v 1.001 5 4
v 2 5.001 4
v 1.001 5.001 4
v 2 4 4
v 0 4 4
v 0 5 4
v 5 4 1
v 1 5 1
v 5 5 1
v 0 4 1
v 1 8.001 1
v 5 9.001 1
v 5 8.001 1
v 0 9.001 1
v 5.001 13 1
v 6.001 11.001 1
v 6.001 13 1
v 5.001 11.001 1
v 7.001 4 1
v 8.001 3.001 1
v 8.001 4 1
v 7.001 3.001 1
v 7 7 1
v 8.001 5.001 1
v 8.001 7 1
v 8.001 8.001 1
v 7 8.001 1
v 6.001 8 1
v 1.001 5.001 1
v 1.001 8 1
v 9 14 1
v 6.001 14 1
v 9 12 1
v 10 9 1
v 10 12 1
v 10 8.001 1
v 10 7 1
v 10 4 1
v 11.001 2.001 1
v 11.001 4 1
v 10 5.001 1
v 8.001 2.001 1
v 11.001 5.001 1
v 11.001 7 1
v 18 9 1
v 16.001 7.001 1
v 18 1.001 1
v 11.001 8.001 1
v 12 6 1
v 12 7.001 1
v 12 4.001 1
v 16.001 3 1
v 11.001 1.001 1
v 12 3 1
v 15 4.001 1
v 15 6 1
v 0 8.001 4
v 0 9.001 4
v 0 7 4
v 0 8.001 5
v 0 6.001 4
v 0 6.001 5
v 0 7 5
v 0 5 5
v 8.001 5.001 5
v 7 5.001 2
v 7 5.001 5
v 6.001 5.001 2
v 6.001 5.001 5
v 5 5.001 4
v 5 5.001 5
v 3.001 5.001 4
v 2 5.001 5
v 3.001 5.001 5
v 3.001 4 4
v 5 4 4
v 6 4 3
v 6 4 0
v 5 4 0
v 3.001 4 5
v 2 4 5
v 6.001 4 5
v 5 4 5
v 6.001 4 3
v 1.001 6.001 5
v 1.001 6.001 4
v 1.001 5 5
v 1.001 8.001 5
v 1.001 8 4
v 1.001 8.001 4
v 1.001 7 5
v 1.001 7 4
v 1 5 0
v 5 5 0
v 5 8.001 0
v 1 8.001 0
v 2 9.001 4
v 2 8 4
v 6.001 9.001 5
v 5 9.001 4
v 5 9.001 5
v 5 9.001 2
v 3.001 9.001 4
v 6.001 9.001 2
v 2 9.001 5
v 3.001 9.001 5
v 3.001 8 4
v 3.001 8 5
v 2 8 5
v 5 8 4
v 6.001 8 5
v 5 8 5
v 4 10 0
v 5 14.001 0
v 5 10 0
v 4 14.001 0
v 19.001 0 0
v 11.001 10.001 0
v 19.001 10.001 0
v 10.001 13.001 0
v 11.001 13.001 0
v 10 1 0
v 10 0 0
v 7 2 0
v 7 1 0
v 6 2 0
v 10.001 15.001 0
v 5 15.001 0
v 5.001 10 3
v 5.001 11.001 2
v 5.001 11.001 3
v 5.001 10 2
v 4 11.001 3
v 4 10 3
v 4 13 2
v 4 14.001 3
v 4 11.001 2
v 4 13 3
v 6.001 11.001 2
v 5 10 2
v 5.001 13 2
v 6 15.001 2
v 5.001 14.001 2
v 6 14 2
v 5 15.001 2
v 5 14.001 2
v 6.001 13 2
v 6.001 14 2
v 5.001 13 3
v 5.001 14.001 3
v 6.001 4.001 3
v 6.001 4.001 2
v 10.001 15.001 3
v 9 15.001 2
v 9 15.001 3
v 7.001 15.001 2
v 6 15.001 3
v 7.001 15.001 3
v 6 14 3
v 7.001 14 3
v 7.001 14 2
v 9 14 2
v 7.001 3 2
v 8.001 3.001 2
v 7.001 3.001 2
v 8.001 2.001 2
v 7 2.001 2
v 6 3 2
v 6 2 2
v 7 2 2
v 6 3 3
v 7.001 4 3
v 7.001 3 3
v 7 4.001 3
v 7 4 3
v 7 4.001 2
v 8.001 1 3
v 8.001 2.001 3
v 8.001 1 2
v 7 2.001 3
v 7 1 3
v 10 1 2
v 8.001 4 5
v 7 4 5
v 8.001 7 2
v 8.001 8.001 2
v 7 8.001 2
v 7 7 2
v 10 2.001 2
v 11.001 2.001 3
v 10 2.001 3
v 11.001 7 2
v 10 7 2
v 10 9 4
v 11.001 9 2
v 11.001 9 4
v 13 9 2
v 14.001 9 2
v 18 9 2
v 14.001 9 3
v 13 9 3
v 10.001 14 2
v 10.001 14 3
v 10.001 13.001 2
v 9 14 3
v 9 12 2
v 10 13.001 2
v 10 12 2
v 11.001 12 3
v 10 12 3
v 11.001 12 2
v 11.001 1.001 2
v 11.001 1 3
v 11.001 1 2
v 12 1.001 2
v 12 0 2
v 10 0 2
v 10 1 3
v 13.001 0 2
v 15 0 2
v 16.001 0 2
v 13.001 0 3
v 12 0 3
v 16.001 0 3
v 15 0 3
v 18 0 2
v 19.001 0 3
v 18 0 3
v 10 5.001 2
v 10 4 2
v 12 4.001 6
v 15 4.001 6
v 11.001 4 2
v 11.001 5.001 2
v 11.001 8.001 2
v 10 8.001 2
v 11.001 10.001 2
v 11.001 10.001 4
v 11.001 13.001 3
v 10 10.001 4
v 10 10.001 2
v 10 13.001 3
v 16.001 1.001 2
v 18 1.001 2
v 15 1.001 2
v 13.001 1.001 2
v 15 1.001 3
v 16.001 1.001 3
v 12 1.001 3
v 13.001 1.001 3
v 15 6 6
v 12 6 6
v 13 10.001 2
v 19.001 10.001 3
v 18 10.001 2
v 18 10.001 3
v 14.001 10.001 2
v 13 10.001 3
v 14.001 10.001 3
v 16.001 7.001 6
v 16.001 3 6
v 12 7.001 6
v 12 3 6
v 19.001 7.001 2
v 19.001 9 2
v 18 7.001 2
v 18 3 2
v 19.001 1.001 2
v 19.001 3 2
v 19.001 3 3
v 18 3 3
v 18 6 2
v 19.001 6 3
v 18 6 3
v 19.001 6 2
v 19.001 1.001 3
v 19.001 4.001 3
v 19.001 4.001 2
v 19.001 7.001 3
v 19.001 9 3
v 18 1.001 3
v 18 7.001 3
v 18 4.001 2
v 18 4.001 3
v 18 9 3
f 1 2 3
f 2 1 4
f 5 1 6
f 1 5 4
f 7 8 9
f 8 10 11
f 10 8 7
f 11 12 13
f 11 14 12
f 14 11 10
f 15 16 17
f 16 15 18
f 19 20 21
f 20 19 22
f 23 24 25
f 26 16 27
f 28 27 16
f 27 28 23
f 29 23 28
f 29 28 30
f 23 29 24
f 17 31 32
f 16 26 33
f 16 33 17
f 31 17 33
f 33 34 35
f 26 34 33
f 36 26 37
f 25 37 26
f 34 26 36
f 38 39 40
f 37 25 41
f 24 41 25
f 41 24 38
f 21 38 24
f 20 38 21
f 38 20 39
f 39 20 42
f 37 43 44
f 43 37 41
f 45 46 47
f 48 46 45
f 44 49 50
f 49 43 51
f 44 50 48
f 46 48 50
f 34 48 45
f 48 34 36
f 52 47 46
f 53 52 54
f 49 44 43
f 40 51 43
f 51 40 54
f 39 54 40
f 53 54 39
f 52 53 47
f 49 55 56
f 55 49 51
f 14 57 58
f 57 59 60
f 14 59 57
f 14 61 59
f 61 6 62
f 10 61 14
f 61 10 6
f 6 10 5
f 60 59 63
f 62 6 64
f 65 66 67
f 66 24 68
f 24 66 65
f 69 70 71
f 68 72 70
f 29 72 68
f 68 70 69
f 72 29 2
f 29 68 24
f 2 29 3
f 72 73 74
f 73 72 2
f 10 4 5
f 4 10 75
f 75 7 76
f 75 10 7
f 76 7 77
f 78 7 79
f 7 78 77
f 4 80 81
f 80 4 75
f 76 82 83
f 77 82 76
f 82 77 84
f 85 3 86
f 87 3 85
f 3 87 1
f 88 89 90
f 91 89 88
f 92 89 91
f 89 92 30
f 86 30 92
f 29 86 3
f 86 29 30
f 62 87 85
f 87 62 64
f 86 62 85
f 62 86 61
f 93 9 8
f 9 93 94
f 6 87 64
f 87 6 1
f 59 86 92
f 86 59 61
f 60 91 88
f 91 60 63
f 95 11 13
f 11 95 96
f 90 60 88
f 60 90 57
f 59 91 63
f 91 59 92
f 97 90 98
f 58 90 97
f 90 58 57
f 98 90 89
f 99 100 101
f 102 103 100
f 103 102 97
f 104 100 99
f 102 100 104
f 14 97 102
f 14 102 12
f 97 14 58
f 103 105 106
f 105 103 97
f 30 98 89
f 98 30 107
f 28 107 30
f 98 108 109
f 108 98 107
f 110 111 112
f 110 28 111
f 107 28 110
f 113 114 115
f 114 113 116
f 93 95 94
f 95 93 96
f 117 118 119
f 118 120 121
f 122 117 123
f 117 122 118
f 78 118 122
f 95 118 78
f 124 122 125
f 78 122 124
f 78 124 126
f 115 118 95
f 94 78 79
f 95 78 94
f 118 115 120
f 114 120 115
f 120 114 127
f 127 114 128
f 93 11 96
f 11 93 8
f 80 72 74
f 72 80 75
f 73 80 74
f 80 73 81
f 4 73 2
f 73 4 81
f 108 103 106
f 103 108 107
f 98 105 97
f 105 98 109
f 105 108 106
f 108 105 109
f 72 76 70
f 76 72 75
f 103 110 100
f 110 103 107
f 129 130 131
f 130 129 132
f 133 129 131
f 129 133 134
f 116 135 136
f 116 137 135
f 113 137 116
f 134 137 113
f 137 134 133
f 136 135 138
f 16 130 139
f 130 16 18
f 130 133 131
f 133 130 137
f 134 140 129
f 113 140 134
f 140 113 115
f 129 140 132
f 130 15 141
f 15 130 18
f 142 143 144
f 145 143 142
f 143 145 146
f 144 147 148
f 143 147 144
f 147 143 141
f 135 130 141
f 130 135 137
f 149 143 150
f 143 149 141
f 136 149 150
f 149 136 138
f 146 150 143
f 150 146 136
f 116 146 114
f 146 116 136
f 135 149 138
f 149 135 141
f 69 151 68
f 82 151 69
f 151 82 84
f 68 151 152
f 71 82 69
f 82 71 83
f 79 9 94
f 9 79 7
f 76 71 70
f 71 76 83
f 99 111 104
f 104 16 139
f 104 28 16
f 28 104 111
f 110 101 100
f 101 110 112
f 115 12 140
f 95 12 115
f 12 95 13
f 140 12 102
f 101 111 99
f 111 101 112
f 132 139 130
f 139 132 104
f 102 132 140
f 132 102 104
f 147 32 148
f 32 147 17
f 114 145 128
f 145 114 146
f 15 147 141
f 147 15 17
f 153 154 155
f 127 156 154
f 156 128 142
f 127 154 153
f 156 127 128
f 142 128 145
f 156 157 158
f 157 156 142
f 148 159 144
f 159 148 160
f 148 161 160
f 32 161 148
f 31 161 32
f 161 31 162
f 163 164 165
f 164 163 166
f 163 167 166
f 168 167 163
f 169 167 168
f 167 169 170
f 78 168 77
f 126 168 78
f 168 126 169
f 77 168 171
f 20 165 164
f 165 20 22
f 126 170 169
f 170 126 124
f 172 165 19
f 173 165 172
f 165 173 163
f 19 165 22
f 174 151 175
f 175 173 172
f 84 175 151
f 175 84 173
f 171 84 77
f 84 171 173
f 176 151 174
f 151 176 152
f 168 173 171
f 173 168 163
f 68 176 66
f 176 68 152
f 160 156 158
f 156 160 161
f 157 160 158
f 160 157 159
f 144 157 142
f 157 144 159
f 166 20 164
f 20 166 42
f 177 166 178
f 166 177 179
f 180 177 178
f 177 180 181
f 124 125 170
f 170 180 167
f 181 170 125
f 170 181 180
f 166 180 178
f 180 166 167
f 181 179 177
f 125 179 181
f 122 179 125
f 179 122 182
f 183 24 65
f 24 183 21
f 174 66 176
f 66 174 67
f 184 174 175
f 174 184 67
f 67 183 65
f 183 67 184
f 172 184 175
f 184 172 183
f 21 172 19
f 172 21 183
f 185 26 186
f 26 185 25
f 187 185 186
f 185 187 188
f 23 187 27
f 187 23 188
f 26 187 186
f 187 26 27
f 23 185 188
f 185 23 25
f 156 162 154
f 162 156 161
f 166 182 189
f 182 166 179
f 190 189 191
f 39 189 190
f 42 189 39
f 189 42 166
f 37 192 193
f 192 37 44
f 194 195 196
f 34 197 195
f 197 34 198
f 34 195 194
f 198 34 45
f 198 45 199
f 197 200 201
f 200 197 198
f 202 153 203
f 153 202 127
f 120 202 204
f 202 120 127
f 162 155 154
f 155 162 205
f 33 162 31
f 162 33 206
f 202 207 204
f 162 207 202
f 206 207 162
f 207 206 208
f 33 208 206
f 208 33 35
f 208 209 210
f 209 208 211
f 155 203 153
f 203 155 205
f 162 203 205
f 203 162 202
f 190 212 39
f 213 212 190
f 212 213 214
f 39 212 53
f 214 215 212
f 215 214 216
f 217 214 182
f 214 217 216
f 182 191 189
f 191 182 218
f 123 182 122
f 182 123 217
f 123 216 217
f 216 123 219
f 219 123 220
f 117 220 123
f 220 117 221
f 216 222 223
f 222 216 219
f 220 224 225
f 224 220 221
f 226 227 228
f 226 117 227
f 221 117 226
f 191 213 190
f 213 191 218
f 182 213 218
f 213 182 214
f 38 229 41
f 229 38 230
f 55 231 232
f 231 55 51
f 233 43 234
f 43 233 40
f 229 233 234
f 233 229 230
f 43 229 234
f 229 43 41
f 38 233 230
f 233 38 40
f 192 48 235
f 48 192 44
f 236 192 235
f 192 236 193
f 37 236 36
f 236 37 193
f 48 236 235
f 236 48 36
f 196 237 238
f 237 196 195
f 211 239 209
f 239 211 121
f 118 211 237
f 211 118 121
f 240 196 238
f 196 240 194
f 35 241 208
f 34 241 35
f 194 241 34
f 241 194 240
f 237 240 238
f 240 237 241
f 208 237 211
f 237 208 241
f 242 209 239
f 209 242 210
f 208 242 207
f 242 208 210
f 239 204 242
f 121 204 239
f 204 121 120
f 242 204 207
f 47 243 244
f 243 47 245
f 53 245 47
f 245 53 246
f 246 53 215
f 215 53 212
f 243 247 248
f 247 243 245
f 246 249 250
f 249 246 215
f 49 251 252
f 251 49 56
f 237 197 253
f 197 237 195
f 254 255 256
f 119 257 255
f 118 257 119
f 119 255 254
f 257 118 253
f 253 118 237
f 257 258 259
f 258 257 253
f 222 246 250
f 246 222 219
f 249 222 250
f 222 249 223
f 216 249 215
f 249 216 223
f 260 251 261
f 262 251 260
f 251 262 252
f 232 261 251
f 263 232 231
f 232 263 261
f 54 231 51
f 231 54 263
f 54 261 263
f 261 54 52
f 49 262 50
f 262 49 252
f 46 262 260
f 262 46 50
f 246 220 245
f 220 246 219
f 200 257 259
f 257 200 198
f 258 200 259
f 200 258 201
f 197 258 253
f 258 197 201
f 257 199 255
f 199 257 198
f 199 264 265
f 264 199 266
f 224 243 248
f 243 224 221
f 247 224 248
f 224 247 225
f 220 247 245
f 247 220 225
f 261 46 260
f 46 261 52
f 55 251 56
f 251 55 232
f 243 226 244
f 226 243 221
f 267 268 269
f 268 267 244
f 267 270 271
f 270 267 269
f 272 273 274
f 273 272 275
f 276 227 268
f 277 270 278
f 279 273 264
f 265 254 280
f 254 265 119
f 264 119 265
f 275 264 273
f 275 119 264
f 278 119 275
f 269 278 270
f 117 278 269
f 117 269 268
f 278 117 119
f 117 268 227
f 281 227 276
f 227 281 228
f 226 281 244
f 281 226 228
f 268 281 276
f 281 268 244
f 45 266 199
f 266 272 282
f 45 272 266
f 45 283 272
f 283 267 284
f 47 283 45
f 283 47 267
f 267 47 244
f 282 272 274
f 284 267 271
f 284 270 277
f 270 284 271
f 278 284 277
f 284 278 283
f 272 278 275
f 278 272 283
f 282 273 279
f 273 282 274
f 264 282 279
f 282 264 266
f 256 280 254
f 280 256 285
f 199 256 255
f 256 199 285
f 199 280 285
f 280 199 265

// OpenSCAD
union () { 
translate([0,4,1]) cube([1.001,1.001,3]);
translate([0,5,1]) cube([1.001,1.001,4]);
translate([0,6,1]) cube([1.001,1.001,3]);
translate([0,7,1]) cube([1.001,1.001,4]);
translate([0,8,1]) cube([1.001,1.001,3]);
translate([1,4,1]) cube([1.001,1.001,3]);
translate([1,5,0]) cube([1.001,1.001,1]);
translate([1,6,0]) cube([1.001,1.001,1]);
translate([1,7,0]) cube([1.001,1.001,1]);
translate([1,8,1]) cube([1.001,1.001,3]);
translate([2,4,1]) cube([1.001,1.001,4]);
translate([2,5,0]) cube([1.001,1.001,1]);
translate([2,6,0]) cube([1.001,1.001,1]);
translate([2,7,0]) cube([1.001,1.001,1]);
translate([2,8,1]) cube([1.001,1.001,4]);
translate([3,4,1]) cube([1.001,1.001,3]);
translate([3,5,0]) cube([1.001,1.001,1]);
translate([3,6,0]) cube([1.001,1.001,1]);
translate([3,7,0]) cube([1.001,1.001,1]);
translate([3,8,1]) cube([1.001,1.001,3]);
translate([4,4,1]) cube([1.001,1.001,3]);
translate([4,5,0]) cube([1.001,1.001,1]);
translate([4,6,0]) cube([1.001,1.001,1]);
translate([4,7,0]) cube([1.001,1.001,1]);
translate([4,8,1]) cube([1.001,1.001,3]);
translate([4,10,0]) cube([1.001,1.001,3]);
translate([4,11,0]) cube([1.001,1.001,2]);
translate([4,12,0]) cube([1.001,1.001,2]);
translate([4,13,0]) cube([1.001,1.001,3]);
translate([5,4,0]) cube([1.001,1.001,5]);
translate([5,5,0]) cube([1.001,1.001,1]);
translate([5,6,0]) cube([1.001,1.001,1]);
translate([5,7,0]) cube([1.001,1.001,1]);
translate([5,8,0]) cube([1.001,1.001,5]);
translate([5,9,0]) cube([1.001,1.001,2]);
translate([5,10,0]) cube([1.001,1.001,2]);
translate([5,11,0]) cube([1.001,1.001,1]);
translate([5,12,0]) cube([1.001,1.001,1]);
translate([5,13,0]) cube([1.001,1.001,2]);
translate([5,14,0]) cube([1.001,1.001,2]);
translate([6,2,0]) cube([1.001,1.001,2]);
translate([6,3,0]) cube([1.001,1.001,3]);
translate([6,4,0]) cube([1.001,1.001,2]);
translate([6,5,0]) cube([1.001,1.001,1]);
translate([6,6,0]) cube([1.001,1.001,1]);
translate([6,7,0]) cube([1.001,1.001,1]);
translate([6,8,0]) cube([1.001,1.001,1]);
translate([6,9,0]) cube([1.001,1.001,1]);
translate([6,10,0]) cube([1.001,1.001,1]);
translate([6,11,0]) cube([1.001,1.001,1]);
translate([6,12,0]) cube([1.001,1.001,1]);
translate([6,13,0]) cube([1.001,1.001,1]);
translate([6,14,0]) cube([1.001,1.001,3]);
translate([7,1,0]) cube([1.001,1.001,3]);
translate([7,2,0]) cube([1.001,1.001,2]);
translate([7,3,0]) cube([1.001,1.001,1]);
translate([7,4,0]) cube([1.001,1.001,5]);
translate([7,5,0]) cube([1.001,1.001,1]);
translate([7,6,0]) cube([1.001,1.001,1]);
translate([7,7,0]) cube([1.001,1.001,2]);
translate([7,8,0]) cube([1.001,1.001,1]);
translate([7,9,0]) cube([1.001,1.001,1]);
translate([7,10,0]) cube([1.001,1.001,1]);
translate([7,11,0]) cube([1.001,1.001,1]);
translate([7,12,0]) cube([1.001,1.001,1]);
translate([7,13,0]) cube([1.001,1.001,1]);
translate([7,14,0]) cube([1.001,1.001,2]);
translate([8,1,0]) cube([1.001,1.001,2]);
translate([8,2,0]) cube([1.001,1.001,1]);
translate([8,3,0]) cube([1.001,1.001,1]);
translate([8,4,0]) cube([1.001,1.001,1]);
translate([8,5,0]) cube([1.001,1.001,1]);
translate([8,6,0]) cube([1.001,1.001,1]);
translate([8,7,0]) cube([1.001,1.001,1]);
translate([8,8,0]) cube([1.001,1.001,1]);
translate([8,9,0]) cube([1.001,1.001,1]);
translate([8,10,0]) cube([1.001,1.001,1]);
translate([8,11,0]) cube([1.001,1.001,1]);
translate([8,12,0]) cube([1.001,1.001,1]);
translate([8,13,0]) cube([1.001,1.001,1]);
translate([8,14,0]) cube([1.001,1.001,2]);
translate([9,1,0]) cube([1.001,1.001,2]);
translate([9,2,0]) cube([1.001,1.001,1]);
translate([9,3,0]) cube([1.001,1.001,1]);
translate([9,4,0]) cube([1.001,1.001,1]);
translate([9,5,0]) cube([1.001,1.001,1]);
translate([9,6,0]) cube([1.001,1.001,1]);
translate([9,7,0]) cube([1.001,1.001,1]);
translate([9,8,0]) cube([1.001,1.001,1]);
translate([9,9,0]) cube([1.001,1.001,1]);
translate([9,10,0]) cube([1.001,1.001,1]);
translate([9,11,0]) cube([1.001,1.001,1]);
translate([9,12,0]) cube([1.001,1.001,2]);
translate([9,13,0]) cube([1.001,1.001,2]);
translate([9,14,0]) cube([1.001,1.001,3]);
translate([10,0,0]) cube([1.001,1.001,2]);
translate([10,1,0]) cube([1.001,1.001,3]);
translate([10,2,0]) cube([1.001,1.001,1]);
translate([10,3,0]) cube([1.001,1.001,1]);
translate([10,4,0]) cube([1.001,1.001,2]);
translate([10,5,0]) cube([1.001,1.001,1]);
translate([10,6,0]) cube([1.001,1.001,1]);
translate([10,7,0]) cube([1.001,1.001,2]);
translate([10,8,0]) cube([1.001,1.001,1]);
translate([10,9,0]) cube([1.001,1.001,4]);
translate([10,10,0]) cube([1.001,1.001,2]);
translate([10,11,0]) cube([1.001,1.001,2]);
translate([10,12,0]) cube([1.001,1.001,3]);
translate([11,0,0]) cube([1.001,1.001,2]);
translate([11,1,0]) cube([1.001,1.001,1]);
translate([11,2,0]) cube([1.001,1.001,1]);
translate([11,3,0]) cube([1.001,1.001,1]);
translate([11,4,0]) cube([1.001,1.001,1]);
translate([11,5,0]) cube([1.001,1.001,1]);
translate([11,6,0]) cube([1.001,1.001,1]);
translate([11,7,0]) cube([1.001,1.001,1]);
translate([11,8,0]) cube([1.001,1.001,1]);
translate([11,9,0]) cube([1.001,1.001,2]);
translate([12,0,0]) cube([1.001,1.001,3]);
translate([12,1,0]) cube([1.001,1.001,1]);
translate([12,2,0]) cube([1.001,1.001,1]);
translate([12,3,0]) cube([1.001,1.001,6]);
translate([12,4,0]) cube([1.001,1.001,1]);
translate([12,5,0]) cube([1.001,1.001,1]);
translate([12,6,0]) cube([1.001,1.001,6]);
translate([12,7,0]) cube([1.001,1.001,1]);
translate([12,8,0]) cube([1.001,1.001,1]);
translate([12,9,0]) cube([1.001,1.001,2]);
translate([13,0,0]) cube([1.001,1.001,2]);
translate([13,1,0]) cube([1.001,1.001,1]);
translate([13,2,0]) cube([1.001,1.001,1]);
translate([13,3,0]) cube([1.001,1.001,6]);
translate([13,4,0]) cube([1.001,1.001,1]);
translate([13,5,0]) cube([1.001,1.001,1]);
translate([13,6,0]) cube([1.001,1.001,6]);
translate([13,7,0]) cube([1.001,1.001,1]);
translate([13,8,0]) cube([1.001,1.001,1]);
translate([13,9,0]) cube([1.001,1.001,3]);
translate([14,0,0]) cube([1.001,1.001,2]);
translate([14,1,0]) cube([1.001,1.001,1]);
translate([14,2,0]) cube([1.001,1.001,1]);
translate([14,3,0]) cube([1.001,1.001,6]);
translate([14,4,0]) cube([1.001,1.001,1]);
translate([14,5,0]) cube([1.001,1.001,1]);
translate([14,6,0]) cube([1.001,1.001,6]);
translate([14,7,0]) cube([1.001,1.001,1]);
translate([14,8,0]) cube([1.001,1.001,1]);
translate([14,9,0]) cube([1.001,1.001,2]);
translate([15,0,0]) cube([1.001,1.001,3]);
translate([15,1,0]) cube([1.001,1.001,1]);
translate([15,2,0]) cube([1.001,1.001,1]);
translate([15,3,0]) cube([1.001,1.001,6]);
translate([15,4,0]) cube([1.001,1.001,6]);
translate([15,5,0]) cube([1.001,1.001,6]);
translate([15,6,0]) cube([1.001,1.001,6]);
translate([15,7,0]) cube([1.001,1.001,1]);
translate([15,8,0]) cube([1.001,1.001,1]);
translate([15,9,0]) cube([1.001,1.001,2]);
translate([16,0,0]) cube([1.001,1.001,2]);
translate([16,1,0]) cube([1.001,1.001,1]);
translate([16,2,0]) cube([1.001,1.001,1]);
translate([16,3,0]) cube([1.001,1.001,1]);
translate([16,4,0]) cube([1.001,1.001,1]);
translate([16,5,0]) cube([1.001,1.001,1]);
translate([16,6,0]) cube([1.001,1.001,1]);
translate([16,7,0]) cube([1.001,1.001,1]);
translate([16,8,0]) cube([1.001,1.001,1]);
translate([16,9,0]) cube([1.001,1.001,2]);
translate([17,0,0]) cube([1.001,1.001,2]);
translate([17,1,0]) cube([1.001,1.001,1]);
translate([17,2,0]) cube([1.001,1.001,1]);
translate([17,3,0]) cube([1.001,1.001,1]);
translate([17,4,0]) cube([1.001,1.001,1]);
translate([17,5,0]) cube([1.001,1.001,1]);
translate([17,6,0]) cube([1.001,1.001,1]);
translate([17,7,0]) cube([1.001,1.001,1]);
translate([17,8,0]) cube([1.001,1.001,1]);
translate([17,9,0]) cube([1.001,1.001,2]);
translate([18,0,0]) cube([1.001,1.001,3]);
translate([18,1,0]) cube([1.001,1.001,2]);
translate([18,2,0]) cube([1.001,1.001,2]);
translate([18,3,0]) cube([1.001,1.001,3]);
translate([18,4,0]) cube([1.001,1.001,2]);
translate([18,5,0]) cube([1.001,1.001,2]);
translate([18,6,0]) cube([1.001,1.001,3]);
translate([18,7,0]) cube([1.001,1.001,2]);
translate([18,8,0]) cube([1.001,1.001,2]);
translate([18,9,0]) cube([1.001,1.001,3]);
}
